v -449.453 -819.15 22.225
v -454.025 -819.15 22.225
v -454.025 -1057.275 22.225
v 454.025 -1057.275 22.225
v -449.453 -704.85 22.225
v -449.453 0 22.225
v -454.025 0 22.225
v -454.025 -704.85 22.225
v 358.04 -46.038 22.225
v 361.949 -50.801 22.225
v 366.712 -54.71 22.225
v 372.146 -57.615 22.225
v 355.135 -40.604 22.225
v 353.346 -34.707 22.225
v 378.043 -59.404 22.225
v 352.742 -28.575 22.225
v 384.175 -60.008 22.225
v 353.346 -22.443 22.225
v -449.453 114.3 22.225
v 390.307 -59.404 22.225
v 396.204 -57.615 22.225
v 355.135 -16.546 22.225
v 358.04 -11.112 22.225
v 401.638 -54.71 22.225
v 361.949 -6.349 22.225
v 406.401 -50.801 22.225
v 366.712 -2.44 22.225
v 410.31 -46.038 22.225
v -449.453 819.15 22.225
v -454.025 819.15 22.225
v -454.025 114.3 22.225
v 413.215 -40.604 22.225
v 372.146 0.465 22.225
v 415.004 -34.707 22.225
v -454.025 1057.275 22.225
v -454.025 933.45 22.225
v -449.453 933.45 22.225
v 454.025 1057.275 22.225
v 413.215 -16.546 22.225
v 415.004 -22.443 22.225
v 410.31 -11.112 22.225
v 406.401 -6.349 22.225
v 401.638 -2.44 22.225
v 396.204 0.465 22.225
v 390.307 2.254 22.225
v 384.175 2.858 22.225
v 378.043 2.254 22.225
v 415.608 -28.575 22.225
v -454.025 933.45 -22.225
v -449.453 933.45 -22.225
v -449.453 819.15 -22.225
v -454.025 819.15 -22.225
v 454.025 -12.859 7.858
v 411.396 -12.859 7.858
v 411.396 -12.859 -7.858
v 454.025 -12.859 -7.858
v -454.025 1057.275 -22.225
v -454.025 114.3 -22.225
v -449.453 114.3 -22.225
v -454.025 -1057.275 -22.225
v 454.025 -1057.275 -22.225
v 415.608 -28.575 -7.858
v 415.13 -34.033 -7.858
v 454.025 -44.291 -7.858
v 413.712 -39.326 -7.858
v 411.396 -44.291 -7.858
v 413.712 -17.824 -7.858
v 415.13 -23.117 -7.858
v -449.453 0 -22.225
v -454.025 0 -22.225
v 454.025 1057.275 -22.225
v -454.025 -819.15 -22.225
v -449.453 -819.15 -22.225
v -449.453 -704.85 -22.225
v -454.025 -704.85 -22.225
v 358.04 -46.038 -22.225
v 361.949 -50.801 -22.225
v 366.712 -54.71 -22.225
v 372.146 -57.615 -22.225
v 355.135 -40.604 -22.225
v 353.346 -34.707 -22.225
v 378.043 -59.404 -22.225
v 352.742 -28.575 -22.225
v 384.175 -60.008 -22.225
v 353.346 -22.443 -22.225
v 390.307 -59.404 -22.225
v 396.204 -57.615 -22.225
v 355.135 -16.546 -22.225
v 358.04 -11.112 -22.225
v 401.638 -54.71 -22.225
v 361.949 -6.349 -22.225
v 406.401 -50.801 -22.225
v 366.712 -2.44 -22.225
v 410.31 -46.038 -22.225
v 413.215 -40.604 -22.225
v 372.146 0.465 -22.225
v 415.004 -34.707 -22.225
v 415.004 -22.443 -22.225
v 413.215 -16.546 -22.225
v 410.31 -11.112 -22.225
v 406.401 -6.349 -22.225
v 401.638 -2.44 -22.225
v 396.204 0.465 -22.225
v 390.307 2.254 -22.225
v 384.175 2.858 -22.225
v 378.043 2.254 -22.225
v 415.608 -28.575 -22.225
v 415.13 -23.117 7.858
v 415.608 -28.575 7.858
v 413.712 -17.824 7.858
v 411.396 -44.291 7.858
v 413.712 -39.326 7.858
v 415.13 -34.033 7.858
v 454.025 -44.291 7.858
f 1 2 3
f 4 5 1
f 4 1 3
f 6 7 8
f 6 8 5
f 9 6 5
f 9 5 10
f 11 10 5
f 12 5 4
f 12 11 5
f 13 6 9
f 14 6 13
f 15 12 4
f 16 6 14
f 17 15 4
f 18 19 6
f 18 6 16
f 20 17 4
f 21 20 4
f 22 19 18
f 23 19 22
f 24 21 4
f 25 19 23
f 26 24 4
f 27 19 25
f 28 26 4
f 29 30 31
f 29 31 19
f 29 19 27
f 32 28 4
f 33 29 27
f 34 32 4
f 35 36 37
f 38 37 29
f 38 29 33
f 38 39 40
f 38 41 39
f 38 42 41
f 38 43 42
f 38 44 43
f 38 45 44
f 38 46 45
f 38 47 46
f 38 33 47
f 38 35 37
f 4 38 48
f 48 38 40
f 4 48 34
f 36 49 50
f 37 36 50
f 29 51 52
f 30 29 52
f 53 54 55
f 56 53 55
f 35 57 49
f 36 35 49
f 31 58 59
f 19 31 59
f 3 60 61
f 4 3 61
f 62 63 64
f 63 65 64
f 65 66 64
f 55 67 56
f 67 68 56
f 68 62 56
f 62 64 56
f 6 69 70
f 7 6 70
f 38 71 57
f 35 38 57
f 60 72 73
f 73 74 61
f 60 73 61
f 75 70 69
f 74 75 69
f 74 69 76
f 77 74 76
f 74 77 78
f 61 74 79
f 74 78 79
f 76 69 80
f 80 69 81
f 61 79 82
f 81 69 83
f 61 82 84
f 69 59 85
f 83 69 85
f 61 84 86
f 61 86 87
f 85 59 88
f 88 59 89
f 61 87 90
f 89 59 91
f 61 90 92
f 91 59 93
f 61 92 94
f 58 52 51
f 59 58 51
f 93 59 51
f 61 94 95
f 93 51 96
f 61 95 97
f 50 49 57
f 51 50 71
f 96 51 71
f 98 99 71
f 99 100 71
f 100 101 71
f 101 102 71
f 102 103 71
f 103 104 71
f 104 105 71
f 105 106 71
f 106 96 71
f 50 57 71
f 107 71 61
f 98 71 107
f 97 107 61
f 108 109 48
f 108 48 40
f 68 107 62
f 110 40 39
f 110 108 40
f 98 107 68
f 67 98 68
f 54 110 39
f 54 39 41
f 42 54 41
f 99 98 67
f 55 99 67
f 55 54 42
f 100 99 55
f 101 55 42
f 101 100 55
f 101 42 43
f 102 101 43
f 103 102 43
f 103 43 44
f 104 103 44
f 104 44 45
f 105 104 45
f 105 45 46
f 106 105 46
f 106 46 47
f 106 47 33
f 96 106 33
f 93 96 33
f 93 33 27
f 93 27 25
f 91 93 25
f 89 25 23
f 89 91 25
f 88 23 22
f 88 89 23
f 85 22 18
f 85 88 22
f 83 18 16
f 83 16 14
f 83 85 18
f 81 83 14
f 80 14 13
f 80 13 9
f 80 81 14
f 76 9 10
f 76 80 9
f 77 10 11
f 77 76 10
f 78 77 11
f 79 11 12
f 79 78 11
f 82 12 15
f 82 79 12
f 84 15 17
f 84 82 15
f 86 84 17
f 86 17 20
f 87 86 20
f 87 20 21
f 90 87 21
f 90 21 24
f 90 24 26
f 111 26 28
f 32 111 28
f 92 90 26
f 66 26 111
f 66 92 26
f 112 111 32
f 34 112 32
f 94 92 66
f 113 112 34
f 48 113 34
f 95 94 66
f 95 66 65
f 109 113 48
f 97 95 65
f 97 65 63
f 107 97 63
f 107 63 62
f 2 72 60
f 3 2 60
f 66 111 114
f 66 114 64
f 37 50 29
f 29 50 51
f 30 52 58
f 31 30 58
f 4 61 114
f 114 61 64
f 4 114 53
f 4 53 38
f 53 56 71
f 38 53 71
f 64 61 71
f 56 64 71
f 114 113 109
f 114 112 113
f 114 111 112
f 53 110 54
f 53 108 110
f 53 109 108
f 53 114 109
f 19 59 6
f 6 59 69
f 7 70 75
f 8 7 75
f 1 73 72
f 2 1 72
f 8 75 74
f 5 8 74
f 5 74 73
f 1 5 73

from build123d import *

# Parameters (mm, degrees)
BOSS_EXTRUDE1_DEPTH      = 22.225
BOSS_EXTRUDE1_DEPTH_BACK = 22.225
SKETCH3_R                = 31.4325
CUT_EXTRUDE1_REACH       = 1395.872
CUT_EXTRUDE1_END_RADIUS  = 31.4325
SKETCH4_W                = 15.71625
SKETCH4_H                = 31.4325


with BuildPart() as part:
    # Sketch3 → Boss-Extrude1 (new, two sides: drawn at the far end of the back side and taken through both)
    with BuildSketch(Plane.XY.offset(-BOSS_EXTRUDE1_DEPTH_BACK)):
        Polygon((454.025, -1057.275), (454.025, 1057.275), (-454.025, 1057.275), (-454.025, 933.45), (-449.453, 933.45), (-449.453, 819.15), (-454.025, 819.15), (-454.025, 114.3), (-449.453, 114.3), (-449.453, 0), (-454.025, 0), (-454.025, -704.85), (-449.453, -704.85), (-449.453, -819.15), (-454.025, -819.15), (-454.025, -1057.275), align=None)
        with Locations((384.175, -28.575)):
            Circle(SKETCH3_R, mode=Mode.SUBTRACT)
    extrude(amount=BOSS_EXTRUDE1_DEPTH + BOSS_EXTRUDE1_DEPTH_BACK)

    # Cut-Extrude1: up to this cylinder (the profile starts outside it)
    cut_extrude1_end = Plane(origin=(384.175, -28.575, 0), z_dir=(0, 0, 1)) * Cylinder(CUT_EXTRUDE1_END_RADIUS, 2855.609, mode=Mode.PRIVATE)
    # Sketch4 → Cut-Extrude1 (cut, up to the surface)
    with BuildSketch(Plane(origin=(454.025, 0, 0), x_dir=(0, 0, -1), z_dir=(1, 0, 0)), mode=Mode.PRIVATE) as cut_extrude1_sk1:
        with Locations((0, -28.575)):
            Rectangle(SKETCH4_W, SKETCH4_H)
    cut_extrude1_tool1 = extrude(cut_extrude1_sk1.sketch, amount=-CUT_EXTRUDE1_REACH, mode=Mode.PRIVATE) - cut_extrude1_end
    add(cut_extrude1_tool1.solids().sort_by_distance((454.025, -28.575, 0))[0], mode=Mode.SUBTRACT)


solid = part.part
